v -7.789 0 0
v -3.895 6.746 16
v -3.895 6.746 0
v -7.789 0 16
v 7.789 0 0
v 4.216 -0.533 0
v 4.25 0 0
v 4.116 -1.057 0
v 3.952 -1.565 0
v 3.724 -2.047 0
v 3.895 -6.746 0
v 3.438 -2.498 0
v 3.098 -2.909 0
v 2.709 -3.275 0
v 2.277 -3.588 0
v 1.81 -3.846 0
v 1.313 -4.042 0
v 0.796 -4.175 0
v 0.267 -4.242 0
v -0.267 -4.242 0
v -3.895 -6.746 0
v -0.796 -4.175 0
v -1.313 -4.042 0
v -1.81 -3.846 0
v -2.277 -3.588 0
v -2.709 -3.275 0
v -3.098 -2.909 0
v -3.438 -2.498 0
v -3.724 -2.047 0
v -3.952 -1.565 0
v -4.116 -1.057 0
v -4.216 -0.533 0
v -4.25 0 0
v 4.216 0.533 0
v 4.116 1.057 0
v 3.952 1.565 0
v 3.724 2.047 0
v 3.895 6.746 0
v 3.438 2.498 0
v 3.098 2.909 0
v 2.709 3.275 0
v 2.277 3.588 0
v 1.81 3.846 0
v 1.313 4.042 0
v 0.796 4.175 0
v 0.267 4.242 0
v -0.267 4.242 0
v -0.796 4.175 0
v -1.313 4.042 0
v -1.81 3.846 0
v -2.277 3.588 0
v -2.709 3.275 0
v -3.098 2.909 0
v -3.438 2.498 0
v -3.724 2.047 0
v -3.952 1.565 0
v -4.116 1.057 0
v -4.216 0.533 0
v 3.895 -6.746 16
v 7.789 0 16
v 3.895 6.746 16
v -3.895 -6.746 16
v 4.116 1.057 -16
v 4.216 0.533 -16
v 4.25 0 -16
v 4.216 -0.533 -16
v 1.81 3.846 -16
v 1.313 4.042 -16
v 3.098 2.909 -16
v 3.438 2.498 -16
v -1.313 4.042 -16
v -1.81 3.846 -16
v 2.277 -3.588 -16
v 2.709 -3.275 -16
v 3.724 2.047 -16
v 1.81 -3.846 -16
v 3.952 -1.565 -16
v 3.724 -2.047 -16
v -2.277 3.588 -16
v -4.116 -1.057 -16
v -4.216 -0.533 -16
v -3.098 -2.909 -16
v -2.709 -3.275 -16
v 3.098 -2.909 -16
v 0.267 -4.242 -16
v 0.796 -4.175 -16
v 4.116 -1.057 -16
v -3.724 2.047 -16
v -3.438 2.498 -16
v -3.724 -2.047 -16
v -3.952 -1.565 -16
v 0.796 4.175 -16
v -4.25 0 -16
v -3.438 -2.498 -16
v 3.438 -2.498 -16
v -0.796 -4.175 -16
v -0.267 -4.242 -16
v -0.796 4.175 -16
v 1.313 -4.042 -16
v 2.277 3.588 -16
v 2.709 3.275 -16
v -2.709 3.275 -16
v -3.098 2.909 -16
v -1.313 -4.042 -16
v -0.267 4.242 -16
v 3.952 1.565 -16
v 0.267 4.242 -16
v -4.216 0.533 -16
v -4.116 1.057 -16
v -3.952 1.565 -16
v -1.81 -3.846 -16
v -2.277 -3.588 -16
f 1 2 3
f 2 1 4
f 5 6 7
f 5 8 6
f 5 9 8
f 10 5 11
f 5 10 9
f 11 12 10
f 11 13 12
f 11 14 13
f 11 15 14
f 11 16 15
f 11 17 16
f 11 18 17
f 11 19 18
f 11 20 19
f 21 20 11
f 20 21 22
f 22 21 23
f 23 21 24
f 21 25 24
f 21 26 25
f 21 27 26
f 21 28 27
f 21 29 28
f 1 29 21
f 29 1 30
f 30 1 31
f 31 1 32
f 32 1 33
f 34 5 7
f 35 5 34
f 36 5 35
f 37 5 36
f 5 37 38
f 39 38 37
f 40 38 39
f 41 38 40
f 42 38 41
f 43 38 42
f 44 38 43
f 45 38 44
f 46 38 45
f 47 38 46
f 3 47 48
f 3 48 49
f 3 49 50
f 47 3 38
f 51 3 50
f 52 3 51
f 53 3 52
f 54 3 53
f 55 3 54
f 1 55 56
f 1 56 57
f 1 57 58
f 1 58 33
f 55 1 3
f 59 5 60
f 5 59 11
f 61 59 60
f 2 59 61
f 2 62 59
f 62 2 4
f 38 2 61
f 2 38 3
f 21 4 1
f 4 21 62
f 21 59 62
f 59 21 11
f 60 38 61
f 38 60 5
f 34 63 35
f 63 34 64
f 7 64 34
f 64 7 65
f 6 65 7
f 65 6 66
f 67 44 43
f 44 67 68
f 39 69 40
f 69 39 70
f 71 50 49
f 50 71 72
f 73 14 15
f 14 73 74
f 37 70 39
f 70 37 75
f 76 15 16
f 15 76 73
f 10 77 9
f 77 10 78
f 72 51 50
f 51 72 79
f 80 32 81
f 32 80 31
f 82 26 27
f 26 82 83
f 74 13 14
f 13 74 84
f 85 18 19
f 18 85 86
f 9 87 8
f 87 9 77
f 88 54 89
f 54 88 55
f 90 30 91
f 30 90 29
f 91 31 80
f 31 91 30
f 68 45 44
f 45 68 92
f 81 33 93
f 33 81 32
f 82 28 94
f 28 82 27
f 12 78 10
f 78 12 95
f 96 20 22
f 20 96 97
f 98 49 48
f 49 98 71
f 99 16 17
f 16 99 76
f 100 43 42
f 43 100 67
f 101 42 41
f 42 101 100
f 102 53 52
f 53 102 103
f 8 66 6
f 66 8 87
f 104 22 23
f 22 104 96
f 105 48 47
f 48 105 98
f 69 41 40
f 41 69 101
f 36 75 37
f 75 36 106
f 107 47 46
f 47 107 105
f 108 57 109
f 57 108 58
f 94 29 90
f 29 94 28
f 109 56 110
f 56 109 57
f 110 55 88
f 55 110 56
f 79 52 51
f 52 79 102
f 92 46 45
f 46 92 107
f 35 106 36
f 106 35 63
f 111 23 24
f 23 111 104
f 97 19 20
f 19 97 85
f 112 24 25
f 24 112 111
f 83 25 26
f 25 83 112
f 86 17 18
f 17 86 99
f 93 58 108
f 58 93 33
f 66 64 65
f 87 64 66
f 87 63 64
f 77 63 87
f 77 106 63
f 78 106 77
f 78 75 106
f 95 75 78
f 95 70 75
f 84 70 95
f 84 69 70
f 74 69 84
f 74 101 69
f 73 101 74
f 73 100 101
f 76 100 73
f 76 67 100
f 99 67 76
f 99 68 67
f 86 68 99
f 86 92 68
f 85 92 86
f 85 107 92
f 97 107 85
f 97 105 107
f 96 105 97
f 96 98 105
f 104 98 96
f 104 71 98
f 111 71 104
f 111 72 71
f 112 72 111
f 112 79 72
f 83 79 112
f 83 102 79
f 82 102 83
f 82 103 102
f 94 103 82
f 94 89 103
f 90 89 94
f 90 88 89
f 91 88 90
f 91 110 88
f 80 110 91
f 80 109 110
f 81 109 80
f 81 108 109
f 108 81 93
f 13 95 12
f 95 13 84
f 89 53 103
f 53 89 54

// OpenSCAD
$fn = 50;


difference() {
	union() {
		linear_extrude(height = 16) {
			polygon(points = [[7.7895000000, 0.0000000000], [3.8947500000, 6.7459048828], [-3.8947500000, 6.7459048828], [-7.7895000000, 0.0000000000], [-3.8947500000, -6.7459048828], [3.8947500000, -6.7459048828]]);
		}
		translate(v = [0, 0, -16]) {
			cylinder(h = 16, r = 4.2500000000);
		}
	}
	union();
}
